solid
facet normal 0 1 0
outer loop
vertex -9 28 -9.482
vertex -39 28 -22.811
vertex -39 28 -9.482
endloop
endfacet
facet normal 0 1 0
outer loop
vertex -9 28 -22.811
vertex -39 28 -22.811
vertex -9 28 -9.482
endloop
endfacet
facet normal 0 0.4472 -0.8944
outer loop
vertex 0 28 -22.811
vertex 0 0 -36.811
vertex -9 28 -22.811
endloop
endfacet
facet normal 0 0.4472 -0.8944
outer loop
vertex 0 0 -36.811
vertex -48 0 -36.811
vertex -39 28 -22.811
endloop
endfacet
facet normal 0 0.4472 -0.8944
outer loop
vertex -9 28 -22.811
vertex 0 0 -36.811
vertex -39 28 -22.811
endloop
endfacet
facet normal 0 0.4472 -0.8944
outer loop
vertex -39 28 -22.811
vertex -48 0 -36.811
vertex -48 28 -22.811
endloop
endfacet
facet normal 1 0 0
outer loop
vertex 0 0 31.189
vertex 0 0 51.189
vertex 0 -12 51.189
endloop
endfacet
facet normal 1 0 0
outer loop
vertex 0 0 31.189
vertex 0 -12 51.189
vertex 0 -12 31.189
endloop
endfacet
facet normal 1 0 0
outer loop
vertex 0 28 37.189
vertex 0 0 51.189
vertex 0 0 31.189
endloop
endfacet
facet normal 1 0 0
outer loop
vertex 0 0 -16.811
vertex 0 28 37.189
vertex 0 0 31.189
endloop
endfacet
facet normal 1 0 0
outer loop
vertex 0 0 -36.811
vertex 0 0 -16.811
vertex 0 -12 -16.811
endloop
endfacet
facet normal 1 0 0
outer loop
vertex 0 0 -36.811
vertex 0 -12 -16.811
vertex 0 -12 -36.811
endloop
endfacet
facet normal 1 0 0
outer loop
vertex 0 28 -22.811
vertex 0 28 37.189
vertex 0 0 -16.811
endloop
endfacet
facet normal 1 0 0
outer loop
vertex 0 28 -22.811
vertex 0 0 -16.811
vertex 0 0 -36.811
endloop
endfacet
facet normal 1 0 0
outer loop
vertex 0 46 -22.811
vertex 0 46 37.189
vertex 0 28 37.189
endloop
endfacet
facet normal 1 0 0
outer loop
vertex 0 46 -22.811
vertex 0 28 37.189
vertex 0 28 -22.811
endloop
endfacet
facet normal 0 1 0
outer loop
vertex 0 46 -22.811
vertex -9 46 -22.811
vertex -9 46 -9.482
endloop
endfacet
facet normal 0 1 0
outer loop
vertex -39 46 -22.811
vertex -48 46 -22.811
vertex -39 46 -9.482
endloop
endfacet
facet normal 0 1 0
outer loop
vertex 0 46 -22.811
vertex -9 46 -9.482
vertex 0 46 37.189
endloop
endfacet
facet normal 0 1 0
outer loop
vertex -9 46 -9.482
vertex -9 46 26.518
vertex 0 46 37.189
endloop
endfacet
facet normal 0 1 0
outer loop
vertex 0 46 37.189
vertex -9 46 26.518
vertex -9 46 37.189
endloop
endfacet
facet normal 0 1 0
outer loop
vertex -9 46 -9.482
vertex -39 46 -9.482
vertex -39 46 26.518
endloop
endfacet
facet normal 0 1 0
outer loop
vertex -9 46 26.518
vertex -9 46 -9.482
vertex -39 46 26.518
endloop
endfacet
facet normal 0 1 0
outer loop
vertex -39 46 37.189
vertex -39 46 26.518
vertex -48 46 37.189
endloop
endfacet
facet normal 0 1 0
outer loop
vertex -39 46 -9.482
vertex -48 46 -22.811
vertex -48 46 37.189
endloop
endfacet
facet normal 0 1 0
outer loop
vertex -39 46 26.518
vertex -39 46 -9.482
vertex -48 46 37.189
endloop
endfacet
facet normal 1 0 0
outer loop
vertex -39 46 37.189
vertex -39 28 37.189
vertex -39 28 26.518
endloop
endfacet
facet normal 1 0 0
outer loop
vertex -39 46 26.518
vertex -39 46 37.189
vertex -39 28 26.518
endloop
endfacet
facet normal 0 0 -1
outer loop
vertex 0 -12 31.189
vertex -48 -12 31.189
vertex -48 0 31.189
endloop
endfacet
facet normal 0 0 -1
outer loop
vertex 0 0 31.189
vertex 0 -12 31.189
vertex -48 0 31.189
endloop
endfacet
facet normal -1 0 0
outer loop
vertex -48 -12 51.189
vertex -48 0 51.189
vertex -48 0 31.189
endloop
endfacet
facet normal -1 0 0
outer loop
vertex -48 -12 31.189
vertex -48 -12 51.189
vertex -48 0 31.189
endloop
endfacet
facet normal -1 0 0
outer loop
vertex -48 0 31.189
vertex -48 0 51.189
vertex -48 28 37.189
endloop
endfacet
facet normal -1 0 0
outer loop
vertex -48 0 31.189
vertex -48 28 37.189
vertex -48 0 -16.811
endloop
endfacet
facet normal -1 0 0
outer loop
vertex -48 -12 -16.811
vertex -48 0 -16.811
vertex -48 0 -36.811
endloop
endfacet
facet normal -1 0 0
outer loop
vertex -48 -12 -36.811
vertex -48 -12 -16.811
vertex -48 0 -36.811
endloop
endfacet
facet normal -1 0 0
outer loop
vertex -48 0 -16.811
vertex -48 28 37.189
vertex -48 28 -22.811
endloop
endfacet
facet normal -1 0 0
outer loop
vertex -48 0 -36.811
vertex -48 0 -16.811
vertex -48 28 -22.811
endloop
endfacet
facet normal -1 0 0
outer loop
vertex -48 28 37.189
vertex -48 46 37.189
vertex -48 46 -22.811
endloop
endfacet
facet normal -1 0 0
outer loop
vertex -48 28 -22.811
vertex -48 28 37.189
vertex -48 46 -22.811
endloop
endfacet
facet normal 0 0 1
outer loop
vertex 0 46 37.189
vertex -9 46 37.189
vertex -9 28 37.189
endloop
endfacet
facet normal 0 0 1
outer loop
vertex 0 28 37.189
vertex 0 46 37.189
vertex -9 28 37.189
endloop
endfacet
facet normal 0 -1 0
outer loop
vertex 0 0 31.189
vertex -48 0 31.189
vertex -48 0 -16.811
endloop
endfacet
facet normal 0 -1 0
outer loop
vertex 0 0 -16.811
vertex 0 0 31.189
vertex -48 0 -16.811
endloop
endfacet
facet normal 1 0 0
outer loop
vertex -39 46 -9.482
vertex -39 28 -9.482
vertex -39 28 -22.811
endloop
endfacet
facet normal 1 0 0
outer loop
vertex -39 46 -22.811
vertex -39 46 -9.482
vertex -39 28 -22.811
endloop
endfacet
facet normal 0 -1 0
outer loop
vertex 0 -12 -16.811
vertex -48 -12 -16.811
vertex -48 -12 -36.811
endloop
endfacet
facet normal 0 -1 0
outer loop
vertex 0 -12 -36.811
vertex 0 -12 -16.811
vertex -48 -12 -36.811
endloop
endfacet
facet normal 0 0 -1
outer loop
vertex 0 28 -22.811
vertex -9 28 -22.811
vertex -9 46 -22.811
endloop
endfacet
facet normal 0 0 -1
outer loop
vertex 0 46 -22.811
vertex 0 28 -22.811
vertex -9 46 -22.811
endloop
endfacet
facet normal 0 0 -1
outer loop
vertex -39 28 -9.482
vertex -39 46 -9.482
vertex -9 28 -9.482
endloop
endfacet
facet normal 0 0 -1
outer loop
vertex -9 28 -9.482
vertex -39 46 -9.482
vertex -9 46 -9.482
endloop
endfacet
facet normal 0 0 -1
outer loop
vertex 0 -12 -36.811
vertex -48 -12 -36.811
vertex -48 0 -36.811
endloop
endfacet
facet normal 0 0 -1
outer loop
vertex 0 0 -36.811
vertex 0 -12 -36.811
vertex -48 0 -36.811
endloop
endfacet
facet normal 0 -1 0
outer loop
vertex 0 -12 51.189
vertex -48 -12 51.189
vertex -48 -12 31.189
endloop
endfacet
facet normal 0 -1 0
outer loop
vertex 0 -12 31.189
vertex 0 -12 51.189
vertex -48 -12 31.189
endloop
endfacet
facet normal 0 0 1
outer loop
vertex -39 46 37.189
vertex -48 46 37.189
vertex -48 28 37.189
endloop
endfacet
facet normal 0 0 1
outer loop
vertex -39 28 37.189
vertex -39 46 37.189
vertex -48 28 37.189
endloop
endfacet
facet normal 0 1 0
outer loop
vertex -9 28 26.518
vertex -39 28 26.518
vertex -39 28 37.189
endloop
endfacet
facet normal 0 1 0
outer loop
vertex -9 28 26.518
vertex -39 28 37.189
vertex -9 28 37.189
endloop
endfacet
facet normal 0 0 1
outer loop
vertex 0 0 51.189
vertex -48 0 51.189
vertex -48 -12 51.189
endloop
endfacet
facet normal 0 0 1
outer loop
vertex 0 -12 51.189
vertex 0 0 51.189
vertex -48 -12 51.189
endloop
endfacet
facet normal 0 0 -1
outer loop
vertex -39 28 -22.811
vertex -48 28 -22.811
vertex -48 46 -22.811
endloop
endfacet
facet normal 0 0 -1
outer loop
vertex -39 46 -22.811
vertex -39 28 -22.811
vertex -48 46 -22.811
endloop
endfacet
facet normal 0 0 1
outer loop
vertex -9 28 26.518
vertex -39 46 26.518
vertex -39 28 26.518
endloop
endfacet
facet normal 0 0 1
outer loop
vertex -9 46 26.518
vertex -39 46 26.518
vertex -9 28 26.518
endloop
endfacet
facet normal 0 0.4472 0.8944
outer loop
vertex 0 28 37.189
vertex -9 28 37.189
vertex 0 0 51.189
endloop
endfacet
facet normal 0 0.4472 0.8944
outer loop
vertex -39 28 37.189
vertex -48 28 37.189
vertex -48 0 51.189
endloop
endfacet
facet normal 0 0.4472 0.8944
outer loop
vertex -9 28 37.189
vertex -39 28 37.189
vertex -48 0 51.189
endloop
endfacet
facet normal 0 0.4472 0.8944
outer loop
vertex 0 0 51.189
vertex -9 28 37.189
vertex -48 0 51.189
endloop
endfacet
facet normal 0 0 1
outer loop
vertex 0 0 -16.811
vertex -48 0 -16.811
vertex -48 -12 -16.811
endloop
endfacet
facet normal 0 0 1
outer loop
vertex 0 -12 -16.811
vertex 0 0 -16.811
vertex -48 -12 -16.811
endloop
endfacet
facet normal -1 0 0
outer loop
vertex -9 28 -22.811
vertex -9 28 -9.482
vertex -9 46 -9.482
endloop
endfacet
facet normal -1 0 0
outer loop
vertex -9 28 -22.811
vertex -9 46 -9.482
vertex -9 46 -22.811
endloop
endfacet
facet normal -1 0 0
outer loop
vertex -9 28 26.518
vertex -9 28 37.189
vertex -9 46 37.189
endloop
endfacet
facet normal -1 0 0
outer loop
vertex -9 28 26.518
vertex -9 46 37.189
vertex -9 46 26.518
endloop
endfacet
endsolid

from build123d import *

# Parameters (mm, degrees)
BOSS_EXTRUDE1_START = -48
BOSS_EXTRUDE1_DEPTH = 48
SKETCH3_W           = 30
SKETCH3_H           = 10.671288352
SKETCH3_H_2         = 13.328711648
CUT_EXTRUDE1_DEPTH  = 18


# Read off the part's stored shape, not the designer's step: Boss-Extrude1
with BuildPart() as part:
    # Boss-Extrude1 outline → Boss-Extrude1 (new body)
    with BuildSketch(Plane(origin=(0, 0, 0), x_dir=(0, 0, -1), z_dir=(1, 0, 0)).offset(BOSS_EXTRUDE1_START)):
        Polygon((-31.189156063, -12), (-31.189156063, 0), (16.810843937, 0), (16.810843937, -12), (36.810843937, -12), (36.810843937, 0), (22.810843937, 28), (22.810843937, 46), (-37.189156063, 46), (-37.189156063, 28), (-51.189156063, 0), (-51.189156063, -12), align=None)
    extrude(amount=BOSS_EXTRUDE1_DEPTH)

    # Sketch3 → Cut-Extrude1 (cut)
    with BuildSketch(Plane(origin=(0, 46, 0), x_dir=(1, 0, 0), z_dir=(0, 1, 0))):
        with Locations((-24, -31.853511887)):
            Rectangle(SKETCH3_W, SKETCH3_H)
        with Locations((-24, 16.146488113)):
            Rectangle(SKETCH3_W, SKETCH3_H_2)
    extrude(amount=-CUT_EXTRUDE1_DEPTH, mode=Mode.SUBTRACT)


solid = part.part
